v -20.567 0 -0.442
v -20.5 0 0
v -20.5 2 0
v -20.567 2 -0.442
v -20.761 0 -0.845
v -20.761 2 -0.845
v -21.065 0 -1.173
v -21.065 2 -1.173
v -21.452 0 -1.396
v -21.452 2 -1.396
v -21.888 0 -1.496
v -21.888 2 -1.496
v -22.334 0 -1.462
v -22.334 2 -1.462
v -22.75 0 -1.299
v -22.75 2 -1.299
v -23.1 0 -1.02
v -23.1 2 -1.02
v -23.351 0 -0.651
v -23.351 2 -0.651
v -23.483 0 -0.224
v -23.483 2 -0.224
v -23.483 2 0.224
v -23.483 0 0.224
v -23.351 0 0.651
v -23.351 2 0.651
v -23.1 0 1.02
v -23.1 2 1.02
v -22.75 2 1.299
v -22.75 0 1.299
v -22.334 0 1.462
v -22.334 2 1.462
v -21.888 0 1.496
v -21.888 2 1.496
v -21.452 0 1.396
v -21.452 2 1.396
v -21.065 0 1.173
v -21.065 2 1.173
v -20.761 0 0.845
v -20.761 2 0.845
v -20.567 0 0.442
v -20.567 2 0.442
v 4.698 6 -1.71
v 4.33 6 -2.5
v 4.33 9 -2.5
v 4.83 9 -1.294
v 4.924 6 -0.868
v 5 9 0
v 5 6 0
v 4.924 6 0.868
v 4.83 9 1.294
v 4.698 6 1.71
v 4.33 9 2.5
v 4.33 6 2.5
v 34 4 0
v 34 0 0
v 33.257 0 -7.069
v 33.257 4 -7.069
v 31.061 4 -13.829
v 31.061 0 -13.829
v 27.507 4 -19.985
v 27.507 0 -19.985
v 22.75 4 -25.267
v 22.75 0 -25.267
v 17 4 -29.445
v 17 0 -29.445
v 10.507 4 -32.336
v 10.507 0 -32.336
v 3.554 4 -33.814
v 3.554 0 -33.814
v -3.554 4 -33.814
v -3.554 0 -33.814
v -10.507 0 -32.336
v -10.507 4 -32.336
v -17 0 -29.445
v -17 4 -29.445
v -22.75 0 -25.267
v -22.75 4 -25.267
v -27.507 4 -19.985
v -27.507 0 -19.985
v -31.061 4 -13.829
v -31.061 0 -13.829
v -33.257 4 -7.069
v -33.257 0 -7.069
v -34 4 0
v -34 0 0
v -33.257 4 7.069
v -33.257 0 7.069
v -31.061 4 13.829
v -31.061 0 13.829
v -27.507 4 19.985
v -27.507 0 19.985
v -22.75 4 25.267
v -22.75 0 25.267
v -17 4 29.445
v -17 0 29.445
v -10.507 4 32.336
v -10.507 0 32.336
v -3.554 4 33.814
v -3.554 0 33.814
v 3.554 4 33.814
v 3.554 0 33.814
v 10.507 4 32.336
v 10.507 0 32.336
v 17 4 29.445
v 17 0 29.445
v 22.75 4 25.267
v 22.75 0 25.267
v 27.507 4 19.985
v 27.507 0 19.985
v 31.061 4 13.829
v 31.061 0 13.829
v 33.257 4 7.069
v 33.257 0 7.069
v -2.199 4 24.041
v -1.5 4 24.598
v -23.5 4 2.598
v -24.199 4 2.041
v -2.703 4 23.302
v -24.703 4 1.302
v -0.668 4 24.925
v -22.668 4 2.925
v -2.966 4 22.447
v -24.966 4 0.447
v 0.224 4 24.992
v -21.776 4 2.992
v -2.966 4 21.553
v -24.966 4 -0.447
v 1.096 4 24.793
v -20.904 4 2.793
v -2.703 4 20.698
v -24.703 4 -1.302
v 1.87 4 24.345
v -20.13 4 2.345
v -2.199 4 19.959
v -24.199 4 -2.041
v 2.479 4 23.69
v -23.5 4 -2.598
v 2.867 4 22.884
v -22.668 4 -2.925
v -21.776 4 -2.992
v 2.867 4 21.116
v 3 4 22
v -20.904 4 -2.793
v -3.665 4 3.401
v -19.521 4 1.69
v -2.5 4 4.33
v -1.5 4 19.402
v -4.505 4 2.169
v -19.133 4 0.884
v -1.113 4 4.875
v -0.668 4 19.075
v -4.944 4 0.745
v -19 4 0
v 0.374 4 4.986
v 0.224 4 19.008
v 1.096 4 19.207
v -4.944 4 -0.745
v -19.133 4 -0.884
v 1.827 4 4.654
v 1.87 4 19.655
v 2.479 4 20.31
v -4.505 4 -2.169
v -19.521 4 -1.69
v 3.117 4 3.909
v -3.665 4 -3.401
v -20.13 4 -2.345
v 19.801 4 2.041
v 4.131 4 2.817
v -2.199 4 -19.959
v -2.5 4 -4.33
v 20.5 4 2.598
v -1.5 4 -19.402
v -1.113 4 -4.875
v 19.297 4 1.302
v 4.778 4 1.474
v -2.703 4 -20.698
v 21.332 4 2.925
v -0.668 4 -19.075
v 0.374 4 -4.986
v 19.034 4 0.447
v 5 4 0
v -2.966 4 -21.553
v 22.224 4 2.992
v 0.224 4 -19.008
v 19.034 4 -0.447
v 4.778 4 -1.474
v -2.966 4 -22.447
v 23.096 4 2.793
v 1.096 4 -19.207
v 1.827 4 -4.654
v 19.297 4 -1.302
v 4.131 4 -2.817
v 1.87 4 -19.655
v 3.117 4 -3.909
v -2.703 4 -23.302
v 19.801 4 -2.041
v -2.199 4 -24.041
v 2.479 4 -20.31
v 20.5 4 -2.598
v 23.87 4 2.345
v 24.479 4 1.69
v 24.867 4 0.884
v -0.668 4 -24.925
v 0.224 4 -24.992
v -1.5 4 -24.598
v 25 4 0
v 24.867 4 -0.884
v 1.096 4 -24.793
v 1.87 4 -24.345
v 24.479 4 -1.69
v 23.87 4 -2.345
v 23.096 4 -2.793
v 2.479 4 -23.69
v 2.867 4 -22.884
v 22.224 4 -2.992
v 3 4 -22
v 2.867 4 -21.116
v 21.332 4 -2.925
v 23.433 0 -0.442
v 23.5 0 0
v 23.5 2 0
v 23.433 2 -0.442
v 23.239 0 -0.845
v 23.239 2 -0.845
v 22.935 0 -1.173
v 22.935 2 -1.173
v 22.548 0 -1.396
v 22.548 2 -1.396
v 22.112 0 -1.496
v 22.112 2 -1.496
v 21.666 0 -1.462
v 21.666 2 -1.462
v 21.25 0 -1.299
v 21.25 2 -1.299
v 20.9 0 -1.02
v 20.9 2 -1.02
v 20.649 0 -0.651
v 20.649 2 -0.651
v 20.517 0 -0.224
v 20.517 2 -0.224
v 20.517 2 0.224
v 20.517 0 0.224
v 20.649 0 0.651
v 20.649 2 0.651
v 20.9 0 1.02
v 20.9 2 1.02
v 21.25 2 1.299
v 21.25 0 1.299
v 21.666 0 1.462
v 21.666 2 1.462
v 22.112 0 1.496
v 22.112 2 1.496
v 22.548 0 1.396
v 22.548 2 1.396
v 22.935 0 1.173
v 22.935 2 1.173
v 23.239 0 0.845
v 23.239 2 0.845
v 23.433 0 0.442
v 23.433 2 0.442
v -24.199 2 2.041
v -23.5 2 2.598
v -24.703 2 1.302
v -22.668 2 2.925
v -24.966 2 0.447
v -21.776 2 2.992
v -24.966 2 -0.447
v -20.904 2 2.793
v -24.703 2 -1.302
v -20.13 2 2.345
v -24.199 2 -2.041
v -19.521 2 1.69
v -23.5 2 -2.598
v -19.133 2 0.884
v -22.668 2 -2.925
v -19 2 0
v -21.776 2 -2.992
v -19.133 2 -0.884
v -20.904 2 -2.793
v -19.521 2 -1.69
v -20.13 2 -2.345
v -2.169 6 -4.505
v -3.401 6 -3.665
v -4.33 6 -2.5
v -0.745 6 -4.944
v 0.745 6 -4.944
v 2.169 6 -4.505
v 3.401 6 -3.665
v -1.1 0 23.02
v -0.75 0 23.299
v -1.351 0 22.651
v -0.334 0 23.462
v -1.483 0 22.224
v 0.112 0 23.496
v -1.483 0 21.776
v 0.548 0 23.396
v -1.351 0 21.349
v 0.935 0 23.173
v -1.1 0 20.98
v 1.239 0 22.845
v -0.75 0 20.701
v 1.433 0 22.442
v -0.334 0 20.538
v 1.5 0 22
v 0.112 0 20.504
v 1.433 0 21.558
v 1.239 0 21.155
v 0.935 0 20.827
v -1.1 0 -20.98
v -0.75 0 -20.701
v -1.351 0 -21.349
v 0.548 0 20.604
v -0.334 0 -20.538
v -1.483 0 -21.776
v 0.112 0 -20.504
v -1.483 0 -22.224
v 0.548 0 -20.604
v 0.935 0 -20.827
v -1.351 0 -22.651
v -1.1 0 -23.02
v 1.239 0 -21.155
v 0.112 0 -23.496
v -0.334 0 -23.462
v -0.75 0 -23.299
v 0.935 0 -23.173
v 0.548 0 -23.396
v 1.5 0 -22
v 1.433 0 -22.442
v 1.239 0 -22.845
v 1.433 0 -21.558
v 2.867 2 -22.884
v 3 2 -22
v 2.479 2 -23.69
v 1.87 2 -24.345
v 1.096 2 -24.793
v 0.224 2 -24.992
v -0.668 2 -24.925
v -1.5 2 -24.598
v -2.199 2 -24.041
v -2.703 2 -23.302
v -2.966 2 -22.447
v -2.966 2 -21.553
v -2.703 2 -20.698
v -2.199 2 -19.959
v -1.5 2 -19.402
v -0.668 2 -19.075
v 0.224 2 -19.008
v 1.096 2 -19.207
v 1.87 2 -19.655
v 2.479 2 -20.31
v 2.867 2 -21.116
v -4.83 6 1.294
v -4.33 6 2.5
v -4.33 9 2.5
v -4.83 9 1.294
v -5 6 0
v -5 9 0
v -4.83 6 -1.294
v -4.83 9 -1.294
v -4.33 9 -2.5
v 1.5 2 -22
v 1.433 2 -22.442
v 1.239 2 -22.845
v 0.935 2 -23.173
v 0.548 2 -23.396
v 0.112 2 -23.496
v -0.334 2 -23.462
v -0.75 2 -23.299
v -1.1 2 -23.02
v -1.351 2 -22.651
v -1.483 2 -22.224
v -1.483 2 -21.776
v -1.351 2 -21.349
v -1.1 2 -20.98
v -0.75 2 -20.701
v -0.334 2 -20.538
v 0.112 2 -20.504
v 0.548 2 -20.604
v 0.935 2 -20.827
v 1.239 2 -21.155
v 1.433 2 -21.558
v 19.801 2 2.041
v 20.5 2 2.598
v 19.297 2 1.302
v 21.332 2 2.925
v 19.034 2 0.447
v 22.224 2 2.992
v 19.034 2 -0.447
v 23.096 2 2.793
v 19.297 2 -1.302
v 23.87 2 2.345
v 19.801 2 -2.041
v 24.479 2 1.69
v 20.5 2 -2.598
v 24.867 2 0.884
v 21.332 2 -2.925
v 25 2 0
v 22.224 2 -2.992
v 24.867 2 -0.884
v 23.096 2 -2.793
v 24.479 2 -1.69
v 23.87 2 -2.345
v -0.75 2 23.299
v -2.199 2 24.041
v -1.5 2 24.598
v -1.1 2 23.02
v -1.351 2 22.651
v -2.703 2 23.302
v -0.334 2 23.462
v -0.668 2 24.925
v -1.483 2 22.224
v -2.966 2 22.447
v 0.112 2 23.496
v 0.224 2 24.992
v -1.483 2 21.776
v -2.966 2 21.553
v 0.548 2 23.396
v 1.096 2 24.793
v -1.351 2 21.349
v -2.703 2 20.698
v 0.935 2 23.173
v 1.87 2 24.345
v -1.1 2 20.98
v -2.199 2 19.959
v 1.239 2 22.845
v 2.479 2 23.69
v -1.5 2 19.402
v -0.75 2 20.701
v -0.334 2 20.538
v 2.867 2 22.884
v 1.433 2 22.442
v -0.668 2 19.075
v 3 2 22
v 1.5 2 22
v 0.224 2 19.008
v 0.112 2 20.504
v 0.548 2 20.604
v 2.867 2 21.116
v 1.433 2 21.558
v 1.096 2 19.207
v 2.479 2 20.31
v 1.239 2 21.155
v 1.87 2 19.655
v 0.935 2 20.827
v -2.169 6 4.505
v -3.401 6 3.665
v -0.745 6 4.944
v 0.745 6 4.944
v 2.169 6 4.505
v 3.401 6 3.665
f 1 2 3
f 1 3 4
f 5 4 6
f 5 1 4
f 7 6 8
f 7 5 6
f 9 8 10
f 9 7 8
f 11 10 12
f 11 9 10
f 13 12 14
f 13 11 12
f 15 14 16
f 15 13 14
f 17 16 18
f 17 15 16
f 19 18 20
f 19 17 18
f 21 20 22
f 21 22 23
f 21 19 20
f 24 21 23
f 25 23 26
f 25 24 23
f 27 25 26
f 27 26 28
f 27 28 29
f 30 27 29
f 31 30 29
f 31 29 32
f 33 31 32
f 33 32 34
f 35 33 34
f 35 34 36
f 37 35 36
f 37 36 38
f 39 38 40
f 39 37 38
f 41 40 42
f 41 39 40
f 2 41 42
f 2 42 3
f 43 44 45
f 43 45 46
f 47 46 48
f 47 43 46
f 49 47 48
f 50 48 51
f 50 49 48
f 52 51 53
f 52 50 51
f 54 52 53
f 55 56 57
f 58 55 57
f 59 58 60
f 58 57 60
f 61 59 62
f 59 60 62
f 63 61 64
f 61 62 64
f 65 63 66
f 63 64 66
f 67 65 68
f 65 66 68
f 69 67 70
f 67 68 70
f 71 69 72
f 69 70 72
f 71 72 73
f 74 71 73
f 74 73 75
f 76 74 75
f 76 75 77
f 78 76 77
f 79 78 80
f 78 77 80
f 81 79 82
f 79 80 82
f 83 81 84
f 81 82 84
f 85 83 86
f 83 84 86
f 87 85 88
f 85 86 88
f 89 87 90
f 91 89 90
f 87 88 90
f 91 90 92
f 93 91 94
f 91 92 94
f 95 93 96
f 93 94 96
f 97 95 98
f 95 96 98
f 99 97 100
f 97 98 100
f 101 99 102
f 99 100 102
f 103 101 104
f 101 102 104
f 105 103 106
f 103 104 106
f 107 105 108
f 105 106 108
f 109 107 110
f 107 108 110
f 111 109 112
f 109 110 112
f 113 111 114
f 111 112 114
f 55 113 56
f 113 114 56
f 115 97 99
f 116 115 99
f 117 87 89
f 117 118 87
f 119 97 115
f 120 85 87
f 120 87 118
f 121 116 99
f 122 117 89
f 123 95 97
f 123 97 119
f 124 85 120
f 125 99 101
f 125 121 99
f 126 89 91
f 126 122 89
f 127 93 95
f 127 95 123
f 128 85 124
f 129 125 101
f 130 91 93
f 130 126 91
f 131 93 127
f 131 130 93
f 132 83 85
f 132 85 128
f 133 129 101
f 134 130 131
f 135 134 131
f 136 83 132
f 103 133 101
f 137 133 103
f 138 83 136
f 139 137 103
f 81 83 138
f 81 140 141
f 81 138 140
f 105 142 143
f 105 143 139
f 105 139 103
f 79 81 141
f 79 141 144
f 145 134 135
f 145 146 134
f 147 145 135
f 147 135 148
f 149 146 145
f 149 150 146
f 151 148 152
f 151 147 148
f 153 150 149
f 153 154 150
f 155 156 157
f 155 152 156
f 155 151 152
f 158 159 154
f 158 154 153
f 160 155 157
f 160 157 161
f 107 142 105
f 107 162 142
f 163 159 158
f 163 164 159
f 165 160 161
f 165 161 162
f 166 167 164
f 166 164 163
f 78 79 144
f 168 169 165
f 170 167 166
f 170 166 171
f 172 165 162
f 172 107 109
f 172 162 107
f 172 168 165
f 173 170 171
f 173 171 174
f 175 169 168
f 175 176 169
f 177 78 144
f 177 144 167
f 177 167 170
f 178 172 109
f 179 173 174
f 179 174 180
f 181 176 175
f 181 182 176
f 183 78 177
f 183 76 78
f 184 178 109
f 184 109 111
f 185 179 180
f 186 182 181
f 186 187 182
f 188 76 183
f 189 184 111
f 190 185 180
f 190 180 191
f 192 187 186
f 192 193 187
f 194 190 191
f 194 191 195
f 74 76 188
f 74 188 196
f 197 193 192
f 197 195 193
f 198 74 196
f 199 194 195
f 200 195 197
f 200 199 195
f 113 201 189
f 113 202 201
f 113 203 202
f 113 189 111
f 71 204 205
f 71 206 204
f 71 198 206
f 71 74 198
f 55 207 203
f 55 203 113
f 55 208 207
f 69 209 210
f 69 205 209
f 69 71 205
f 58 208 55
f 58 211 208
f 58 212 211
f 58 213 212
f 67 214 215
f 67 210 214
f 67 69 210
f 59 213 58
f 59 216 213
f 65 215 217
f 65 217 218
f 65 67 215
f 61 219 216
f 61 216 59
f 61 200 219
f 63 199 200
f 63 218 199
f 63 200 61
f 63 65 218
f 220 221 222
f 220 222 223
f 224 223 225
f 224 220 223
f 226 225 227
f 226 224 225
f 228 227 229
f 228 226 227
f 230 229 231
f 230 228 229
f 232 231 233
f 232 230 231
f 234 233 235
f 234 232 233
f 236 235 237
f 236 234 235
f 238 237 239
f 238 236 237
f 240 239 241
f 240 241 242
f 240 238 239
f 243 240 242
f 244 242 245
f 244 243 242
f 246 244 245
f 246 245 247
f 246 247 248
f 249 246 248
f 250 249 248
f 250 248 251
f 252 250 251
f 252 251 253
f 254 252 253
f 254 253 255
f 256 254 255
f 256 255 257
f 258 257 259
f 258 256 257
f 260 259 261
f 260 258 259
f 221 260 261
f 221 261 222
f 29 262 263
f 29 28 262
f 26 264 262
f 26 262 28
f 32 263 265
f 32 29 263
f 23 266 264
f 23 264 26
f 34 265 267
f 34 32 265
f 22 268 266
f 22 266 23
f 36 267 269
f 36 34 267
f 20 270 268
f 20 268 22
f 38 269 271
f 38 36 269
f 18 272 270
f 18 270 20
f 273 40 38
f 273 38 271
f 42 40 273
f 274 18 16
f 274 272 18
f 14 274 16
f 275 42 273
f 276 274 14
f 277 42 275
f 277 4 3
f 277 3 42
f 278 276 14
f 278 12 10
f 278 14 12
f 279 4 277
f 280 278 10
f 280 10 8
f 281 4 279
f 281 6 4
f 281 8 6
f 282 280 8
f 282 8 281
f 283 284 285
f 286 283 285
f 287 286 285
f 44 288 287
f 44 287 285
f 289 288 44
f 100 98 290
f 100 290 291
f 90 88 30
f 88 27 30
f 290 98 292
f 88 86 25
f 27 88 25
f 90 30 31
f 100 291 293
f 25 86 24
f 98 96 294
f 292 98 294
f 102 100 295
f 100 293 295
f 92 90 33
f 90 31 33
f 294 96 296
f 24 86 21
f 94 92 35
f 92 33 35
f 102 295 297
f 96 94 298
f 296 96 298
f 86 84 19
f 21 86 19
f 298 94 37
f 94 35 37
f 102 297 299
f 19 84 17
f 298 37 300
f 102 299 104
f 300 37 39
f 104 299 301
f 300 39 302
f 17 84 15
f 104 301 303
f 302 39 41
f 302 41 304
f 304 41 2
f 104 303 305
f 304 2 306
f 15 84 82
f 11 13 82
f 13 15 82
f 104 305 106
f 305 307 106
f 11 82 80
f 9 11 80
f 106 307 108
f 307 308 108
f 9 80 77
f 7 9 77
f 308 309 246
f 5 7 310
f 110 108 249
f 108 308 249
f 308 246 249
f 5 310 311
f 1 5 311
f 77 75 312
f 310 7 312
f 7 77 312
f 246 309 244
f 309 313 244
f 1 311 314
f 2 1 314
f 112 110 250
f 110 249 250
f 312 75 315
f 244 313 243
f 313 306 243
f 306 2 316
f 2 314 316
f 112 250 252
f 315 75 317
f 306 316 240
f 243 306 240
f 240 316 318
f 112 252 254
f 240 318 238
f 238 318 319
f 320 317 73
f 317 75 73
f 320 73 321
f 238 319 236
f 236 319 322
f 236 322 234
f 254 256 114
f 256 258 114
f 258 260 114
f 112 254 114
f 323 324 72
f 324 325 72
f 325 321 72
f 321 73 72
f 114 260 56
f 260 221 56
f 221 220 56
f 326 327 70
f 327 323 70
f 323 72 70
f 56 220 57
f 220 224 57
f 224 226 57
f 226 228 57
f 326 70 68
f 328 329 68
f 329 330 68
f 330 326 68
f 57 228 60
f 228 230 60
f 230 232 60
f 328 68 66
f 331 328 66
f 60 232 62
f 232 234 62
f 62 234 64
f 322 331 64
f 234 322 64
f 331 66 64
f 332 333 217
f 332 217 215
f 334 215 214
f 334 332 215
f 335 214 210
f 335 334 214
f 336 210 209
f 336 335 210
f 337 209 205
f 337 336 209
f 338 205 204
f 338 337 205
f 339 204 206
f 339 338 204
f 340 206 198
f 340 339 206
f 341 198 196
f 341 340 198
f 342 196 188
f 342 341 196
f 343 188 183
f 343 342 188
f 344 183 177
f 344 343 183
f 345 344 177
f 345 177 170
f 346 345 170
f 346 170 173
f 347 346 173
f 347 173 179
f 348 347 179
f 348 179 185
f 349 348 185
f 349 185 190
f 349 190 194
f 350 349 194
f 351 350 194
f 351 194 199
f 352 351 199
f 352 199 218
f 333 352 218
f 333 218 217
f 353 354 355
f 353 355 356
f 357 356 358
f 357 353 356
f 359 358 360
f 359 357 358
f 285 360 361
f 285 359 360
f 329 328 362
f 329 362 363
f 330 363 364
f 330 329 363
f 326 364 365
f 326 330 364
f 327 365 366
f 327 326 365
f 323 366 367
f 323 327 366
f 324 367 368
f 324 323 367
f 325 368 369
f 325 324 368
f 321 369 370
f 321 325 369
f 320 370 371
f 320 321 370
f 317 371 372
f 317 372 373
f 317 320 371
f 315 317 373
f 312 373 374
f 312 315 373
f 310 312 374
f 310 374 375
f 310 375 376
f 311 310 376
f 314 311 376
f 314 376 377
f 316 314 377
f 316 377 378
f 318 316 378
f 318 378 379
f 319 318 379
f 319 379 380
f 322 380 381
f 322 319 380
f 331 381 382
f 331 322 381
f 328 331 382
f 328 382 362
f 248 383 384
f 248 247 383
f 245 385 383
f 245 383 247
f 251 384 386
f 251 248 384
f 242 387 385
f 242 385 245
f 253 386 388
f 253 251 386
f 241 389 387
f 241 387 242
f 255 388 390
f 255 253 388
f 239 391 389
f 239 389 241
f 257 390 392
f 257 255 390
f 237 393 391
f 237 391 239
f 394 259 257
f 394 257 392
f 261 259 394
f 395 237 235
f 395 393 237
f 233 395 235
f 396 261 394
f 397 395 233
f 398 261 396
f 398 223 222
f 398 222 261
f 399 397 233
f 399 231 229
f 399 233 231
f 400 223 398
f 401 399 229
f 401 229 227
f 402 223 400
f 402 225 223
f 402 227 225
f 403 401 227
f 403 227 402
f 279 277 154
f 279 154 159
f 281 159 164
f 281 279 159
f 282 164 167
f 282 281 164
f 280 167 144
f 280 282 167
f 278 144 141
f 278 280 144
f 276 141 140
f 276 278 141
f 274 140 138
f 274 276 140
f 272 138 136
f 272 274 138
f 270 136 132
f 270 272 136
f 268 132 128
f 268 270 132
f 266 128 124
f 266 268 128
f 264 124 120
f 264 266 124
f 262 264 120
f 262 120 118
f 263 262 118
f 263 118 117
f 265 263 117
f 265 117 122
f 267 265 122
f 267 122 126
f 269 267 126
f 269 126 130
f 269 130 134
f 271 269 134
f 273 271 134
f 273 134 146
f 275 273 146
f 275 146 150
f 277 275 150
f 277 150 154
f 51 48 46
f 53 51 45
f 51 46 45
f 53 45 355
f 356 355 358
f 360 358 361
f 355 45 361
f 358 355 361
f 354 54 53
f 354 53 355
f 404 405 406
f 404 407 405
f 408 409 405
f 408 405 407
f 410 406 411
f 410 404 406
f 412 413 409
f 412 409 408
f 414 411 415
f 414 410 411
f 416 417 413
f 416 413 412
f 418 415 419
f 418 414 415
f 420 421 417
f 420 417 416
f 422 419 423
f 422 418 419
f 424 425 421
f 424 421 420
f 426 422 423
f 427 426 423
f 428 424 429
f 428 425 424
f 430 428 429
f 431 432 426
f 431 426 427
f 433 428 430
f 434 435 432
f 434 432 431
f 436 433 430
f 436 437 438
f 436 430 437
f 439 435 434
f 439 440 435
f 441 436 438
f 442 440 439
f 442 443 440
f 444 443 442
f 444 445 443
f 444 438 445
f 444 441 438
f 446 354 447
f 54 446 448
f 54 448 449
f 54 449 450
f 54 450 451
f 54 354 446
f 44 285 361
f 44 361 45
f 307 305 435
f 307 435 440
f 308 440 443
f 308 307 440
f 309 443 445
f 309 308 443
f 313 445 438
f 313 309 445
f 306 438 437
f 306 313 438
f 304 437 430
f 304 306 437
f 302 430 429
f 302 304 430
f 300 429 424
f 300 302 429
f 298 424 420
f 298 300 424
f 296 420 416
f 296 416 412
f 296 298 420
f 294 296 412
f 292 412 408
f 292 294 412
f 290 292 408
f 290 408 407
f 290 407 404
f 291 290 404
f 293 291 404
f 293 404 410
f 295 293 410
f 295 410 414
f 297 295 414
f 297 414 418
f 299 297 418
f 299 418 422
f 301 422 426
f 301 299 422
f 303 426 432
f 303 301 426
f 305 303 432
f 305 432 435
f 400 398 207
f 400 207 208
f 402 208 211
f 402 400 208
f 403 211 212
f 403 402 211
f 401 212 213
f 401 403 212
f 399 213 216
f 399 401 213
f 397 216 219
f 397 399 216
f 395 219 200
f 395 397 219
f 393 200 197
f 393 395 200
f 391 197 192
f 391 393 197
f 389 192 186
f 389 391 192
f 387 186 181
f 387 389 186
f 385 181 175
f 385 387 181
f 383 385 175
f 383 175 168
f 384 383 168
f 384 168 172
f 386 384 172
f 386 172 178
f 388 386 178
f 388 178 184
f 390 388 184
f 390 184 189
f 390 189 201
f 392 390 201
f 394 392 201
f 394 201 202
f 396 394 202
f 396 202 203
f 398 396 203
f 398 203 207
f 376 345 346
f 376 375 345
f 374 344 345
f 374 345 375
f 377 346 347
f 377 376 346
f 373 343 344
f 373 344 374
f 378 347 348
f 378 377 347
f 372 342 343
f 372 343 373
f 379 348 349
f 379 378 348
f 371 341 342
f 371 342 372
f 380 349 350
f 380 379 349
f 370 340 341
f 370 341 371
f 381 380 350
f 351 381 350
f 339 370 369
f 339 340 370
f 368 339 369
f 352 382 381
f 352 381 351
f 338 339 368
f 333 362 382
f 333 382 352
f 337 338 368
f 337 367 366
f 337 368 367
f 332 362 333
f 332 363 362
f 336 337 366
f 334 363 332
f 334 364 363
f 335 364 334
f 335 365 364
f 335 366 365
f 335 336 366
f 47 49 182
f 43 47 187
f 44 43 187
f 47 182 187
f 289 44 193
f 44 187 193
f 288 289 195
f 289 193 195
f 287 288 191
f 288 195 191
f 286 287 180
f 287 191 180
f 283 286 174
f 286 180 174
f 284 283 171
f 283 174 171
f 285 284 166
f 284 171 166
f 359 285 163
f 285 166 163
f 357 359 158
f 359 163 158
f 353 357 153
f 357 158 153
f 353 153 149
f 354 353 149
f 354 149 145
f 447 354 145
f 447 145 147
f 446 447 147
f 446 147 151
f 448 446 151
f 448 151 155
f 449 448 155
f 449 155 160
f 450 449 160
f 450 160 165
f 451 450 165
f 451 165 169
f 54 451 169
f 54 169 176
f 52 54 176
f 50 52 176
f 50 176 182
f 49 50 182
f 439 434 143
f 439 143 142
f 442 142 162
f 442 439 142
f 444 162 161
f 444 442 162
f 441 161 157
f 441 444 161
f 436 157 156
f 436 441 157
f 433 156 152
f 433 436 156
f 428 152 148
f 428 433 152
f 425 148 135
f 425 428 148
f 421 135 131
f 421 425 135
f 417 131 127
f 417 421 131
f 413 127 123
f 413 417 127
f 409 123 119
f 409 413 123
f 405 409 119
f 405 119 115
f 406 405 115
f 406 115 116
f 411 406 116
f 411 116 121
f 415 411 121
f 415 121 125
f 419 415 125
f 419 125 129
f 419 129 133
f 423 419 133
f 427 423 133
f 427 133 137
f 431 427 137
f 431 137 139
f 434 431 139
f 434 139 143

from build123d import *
from build123d.topology import SkipClean

# Parameters (mm, degrees)
SKETCH_1_R      = 34
SKETCH_1_R_2    = 3
EXTRUDE_1_DEPTH = 4
SKETCH_1_3_R    = 3
SKETCH_1_3_R_2  = 1.5
EXTRUDE_2_DEPTH = 2
SKETCH_2_R      = 5
EXTRUDE_3_DEPTH = 2
EXTRUDE_4_DEPTH = 3


with BuildPart() as part:
    # 草图1 → 凸台-拉伸1 (new body)
    with BuildSketch(Plane(origin=(0, 0, 0), x_dir=(1, 0, 0), z_dir=(0, 1, 0))):
        Circle(SKETCH_1_R)
        with Locations((-22, 0)):
            Circle(SKETCH_1_R_2, mode=Mode.SUBTRACT)
        with Locations((0, -22)):
            Circle(SKETCH_1_R_2, mode=Mode.SUBTRACT)
        with Locations((22, 0)):
            Circle(SKETCH_1_R_2, mode=Mode.SUBTRACT)
        with Locations((0, 22)):
            Circle(SKETCH_1_R_2, mode=Mode.SUBTRACT)
    extrude(amount=EXTRUDE_1_DEPTH)

    # 草图1<3> → 凸台-拉伸2 (add)
    # profile 1 of 4: a face of its own
    with BuildSketch(Plane(origin=(0, 0, 0), x_dir=(1, 0, 0), z_dir=(0, 1, 0))):
        with Locations((0, 22)):
            Circle(SKETCH_1_3_R)
        with Locations((0, 22)):
            Circle(SKETCH_1_3_R_2, mode=Mode.SUBTRACT)
    # profile 2 of 4: a face of its own
    with BuildSketch(Plane(origin=(0, 0, 0), x_dir=(1, 0, 0), z_dir=(0, 1, 0))):
        with Locations((22, 0)):
            Circle(SKETCH_1_3_R)
        with Locations((22, 0)):
            Circle(SKETCH_1_3_R_2, mode=Mode.SUBTRACT)
    # profile 3 of 4: a face of its own
    with BuildSketch(Plane(origin=(0, 0, 0), x_dir=(1, 0, 0), z_dir=(0, 1, 0))):
        with Locations((0, -22)):
            Circle(SKETCH_1_3_R)
        with Locations((0, -22)):
            Circle(SKETCH_1_3_R_2, mode=Mode.SUBTRACT)
    # profile 4 of 4: a face of its own
    with BuildSketch(Plane(origin=(0, 0, 0), x_dir=(1, 0, 0), z_dir=(0, 1, 0))):
        with Locations((-22, 0)):
            Circle(SKETCH_1_3_R)
        with Locations((-22, 0)):
            Circle(SKETCH_1_3_R_2, mode=Mode.SUBTRACT)
    extrude(amount=EXTRUDE_2_DEPTH)

    # 草图2 → 凸台-拉伸3 (add)
    with BuildSketch(Plane(origin=(0, 4, 0), x_dir=(1, 0, 0), z_dir=(0, 1, 0))):
        Circle(SKETCH_2_R)
    extrude(amount=EXTRUDE_3_DEPTH)

    # 草图3 → 凸台-拉伸4 (add)
    with SkipClean():  # the faces are left unmerged after this step: merging them gives an invalid solid
        with BuildSketch(Plane(origin=(0, 6, 0), x_dir=(1, 0, 0), z_dir=(0, 1, 0))):
            with BuildLine():
                Line((-4.330127019, 2.5), (4.330127019, 2.5))
                ThreePointArc((4.330127019, 2.5), (5, 0), (4.330127019, -2.5))
                Line((4.330127019, -2.5), (-4.330127019, -2.5))
                ThreePointArc((-4.330127019, -2.5), (-5, 0), (-4.330127019, 2.5))
            make_face()
        extrude(amount=EXTRUDE_4_DEPTH)


solid = part.part
